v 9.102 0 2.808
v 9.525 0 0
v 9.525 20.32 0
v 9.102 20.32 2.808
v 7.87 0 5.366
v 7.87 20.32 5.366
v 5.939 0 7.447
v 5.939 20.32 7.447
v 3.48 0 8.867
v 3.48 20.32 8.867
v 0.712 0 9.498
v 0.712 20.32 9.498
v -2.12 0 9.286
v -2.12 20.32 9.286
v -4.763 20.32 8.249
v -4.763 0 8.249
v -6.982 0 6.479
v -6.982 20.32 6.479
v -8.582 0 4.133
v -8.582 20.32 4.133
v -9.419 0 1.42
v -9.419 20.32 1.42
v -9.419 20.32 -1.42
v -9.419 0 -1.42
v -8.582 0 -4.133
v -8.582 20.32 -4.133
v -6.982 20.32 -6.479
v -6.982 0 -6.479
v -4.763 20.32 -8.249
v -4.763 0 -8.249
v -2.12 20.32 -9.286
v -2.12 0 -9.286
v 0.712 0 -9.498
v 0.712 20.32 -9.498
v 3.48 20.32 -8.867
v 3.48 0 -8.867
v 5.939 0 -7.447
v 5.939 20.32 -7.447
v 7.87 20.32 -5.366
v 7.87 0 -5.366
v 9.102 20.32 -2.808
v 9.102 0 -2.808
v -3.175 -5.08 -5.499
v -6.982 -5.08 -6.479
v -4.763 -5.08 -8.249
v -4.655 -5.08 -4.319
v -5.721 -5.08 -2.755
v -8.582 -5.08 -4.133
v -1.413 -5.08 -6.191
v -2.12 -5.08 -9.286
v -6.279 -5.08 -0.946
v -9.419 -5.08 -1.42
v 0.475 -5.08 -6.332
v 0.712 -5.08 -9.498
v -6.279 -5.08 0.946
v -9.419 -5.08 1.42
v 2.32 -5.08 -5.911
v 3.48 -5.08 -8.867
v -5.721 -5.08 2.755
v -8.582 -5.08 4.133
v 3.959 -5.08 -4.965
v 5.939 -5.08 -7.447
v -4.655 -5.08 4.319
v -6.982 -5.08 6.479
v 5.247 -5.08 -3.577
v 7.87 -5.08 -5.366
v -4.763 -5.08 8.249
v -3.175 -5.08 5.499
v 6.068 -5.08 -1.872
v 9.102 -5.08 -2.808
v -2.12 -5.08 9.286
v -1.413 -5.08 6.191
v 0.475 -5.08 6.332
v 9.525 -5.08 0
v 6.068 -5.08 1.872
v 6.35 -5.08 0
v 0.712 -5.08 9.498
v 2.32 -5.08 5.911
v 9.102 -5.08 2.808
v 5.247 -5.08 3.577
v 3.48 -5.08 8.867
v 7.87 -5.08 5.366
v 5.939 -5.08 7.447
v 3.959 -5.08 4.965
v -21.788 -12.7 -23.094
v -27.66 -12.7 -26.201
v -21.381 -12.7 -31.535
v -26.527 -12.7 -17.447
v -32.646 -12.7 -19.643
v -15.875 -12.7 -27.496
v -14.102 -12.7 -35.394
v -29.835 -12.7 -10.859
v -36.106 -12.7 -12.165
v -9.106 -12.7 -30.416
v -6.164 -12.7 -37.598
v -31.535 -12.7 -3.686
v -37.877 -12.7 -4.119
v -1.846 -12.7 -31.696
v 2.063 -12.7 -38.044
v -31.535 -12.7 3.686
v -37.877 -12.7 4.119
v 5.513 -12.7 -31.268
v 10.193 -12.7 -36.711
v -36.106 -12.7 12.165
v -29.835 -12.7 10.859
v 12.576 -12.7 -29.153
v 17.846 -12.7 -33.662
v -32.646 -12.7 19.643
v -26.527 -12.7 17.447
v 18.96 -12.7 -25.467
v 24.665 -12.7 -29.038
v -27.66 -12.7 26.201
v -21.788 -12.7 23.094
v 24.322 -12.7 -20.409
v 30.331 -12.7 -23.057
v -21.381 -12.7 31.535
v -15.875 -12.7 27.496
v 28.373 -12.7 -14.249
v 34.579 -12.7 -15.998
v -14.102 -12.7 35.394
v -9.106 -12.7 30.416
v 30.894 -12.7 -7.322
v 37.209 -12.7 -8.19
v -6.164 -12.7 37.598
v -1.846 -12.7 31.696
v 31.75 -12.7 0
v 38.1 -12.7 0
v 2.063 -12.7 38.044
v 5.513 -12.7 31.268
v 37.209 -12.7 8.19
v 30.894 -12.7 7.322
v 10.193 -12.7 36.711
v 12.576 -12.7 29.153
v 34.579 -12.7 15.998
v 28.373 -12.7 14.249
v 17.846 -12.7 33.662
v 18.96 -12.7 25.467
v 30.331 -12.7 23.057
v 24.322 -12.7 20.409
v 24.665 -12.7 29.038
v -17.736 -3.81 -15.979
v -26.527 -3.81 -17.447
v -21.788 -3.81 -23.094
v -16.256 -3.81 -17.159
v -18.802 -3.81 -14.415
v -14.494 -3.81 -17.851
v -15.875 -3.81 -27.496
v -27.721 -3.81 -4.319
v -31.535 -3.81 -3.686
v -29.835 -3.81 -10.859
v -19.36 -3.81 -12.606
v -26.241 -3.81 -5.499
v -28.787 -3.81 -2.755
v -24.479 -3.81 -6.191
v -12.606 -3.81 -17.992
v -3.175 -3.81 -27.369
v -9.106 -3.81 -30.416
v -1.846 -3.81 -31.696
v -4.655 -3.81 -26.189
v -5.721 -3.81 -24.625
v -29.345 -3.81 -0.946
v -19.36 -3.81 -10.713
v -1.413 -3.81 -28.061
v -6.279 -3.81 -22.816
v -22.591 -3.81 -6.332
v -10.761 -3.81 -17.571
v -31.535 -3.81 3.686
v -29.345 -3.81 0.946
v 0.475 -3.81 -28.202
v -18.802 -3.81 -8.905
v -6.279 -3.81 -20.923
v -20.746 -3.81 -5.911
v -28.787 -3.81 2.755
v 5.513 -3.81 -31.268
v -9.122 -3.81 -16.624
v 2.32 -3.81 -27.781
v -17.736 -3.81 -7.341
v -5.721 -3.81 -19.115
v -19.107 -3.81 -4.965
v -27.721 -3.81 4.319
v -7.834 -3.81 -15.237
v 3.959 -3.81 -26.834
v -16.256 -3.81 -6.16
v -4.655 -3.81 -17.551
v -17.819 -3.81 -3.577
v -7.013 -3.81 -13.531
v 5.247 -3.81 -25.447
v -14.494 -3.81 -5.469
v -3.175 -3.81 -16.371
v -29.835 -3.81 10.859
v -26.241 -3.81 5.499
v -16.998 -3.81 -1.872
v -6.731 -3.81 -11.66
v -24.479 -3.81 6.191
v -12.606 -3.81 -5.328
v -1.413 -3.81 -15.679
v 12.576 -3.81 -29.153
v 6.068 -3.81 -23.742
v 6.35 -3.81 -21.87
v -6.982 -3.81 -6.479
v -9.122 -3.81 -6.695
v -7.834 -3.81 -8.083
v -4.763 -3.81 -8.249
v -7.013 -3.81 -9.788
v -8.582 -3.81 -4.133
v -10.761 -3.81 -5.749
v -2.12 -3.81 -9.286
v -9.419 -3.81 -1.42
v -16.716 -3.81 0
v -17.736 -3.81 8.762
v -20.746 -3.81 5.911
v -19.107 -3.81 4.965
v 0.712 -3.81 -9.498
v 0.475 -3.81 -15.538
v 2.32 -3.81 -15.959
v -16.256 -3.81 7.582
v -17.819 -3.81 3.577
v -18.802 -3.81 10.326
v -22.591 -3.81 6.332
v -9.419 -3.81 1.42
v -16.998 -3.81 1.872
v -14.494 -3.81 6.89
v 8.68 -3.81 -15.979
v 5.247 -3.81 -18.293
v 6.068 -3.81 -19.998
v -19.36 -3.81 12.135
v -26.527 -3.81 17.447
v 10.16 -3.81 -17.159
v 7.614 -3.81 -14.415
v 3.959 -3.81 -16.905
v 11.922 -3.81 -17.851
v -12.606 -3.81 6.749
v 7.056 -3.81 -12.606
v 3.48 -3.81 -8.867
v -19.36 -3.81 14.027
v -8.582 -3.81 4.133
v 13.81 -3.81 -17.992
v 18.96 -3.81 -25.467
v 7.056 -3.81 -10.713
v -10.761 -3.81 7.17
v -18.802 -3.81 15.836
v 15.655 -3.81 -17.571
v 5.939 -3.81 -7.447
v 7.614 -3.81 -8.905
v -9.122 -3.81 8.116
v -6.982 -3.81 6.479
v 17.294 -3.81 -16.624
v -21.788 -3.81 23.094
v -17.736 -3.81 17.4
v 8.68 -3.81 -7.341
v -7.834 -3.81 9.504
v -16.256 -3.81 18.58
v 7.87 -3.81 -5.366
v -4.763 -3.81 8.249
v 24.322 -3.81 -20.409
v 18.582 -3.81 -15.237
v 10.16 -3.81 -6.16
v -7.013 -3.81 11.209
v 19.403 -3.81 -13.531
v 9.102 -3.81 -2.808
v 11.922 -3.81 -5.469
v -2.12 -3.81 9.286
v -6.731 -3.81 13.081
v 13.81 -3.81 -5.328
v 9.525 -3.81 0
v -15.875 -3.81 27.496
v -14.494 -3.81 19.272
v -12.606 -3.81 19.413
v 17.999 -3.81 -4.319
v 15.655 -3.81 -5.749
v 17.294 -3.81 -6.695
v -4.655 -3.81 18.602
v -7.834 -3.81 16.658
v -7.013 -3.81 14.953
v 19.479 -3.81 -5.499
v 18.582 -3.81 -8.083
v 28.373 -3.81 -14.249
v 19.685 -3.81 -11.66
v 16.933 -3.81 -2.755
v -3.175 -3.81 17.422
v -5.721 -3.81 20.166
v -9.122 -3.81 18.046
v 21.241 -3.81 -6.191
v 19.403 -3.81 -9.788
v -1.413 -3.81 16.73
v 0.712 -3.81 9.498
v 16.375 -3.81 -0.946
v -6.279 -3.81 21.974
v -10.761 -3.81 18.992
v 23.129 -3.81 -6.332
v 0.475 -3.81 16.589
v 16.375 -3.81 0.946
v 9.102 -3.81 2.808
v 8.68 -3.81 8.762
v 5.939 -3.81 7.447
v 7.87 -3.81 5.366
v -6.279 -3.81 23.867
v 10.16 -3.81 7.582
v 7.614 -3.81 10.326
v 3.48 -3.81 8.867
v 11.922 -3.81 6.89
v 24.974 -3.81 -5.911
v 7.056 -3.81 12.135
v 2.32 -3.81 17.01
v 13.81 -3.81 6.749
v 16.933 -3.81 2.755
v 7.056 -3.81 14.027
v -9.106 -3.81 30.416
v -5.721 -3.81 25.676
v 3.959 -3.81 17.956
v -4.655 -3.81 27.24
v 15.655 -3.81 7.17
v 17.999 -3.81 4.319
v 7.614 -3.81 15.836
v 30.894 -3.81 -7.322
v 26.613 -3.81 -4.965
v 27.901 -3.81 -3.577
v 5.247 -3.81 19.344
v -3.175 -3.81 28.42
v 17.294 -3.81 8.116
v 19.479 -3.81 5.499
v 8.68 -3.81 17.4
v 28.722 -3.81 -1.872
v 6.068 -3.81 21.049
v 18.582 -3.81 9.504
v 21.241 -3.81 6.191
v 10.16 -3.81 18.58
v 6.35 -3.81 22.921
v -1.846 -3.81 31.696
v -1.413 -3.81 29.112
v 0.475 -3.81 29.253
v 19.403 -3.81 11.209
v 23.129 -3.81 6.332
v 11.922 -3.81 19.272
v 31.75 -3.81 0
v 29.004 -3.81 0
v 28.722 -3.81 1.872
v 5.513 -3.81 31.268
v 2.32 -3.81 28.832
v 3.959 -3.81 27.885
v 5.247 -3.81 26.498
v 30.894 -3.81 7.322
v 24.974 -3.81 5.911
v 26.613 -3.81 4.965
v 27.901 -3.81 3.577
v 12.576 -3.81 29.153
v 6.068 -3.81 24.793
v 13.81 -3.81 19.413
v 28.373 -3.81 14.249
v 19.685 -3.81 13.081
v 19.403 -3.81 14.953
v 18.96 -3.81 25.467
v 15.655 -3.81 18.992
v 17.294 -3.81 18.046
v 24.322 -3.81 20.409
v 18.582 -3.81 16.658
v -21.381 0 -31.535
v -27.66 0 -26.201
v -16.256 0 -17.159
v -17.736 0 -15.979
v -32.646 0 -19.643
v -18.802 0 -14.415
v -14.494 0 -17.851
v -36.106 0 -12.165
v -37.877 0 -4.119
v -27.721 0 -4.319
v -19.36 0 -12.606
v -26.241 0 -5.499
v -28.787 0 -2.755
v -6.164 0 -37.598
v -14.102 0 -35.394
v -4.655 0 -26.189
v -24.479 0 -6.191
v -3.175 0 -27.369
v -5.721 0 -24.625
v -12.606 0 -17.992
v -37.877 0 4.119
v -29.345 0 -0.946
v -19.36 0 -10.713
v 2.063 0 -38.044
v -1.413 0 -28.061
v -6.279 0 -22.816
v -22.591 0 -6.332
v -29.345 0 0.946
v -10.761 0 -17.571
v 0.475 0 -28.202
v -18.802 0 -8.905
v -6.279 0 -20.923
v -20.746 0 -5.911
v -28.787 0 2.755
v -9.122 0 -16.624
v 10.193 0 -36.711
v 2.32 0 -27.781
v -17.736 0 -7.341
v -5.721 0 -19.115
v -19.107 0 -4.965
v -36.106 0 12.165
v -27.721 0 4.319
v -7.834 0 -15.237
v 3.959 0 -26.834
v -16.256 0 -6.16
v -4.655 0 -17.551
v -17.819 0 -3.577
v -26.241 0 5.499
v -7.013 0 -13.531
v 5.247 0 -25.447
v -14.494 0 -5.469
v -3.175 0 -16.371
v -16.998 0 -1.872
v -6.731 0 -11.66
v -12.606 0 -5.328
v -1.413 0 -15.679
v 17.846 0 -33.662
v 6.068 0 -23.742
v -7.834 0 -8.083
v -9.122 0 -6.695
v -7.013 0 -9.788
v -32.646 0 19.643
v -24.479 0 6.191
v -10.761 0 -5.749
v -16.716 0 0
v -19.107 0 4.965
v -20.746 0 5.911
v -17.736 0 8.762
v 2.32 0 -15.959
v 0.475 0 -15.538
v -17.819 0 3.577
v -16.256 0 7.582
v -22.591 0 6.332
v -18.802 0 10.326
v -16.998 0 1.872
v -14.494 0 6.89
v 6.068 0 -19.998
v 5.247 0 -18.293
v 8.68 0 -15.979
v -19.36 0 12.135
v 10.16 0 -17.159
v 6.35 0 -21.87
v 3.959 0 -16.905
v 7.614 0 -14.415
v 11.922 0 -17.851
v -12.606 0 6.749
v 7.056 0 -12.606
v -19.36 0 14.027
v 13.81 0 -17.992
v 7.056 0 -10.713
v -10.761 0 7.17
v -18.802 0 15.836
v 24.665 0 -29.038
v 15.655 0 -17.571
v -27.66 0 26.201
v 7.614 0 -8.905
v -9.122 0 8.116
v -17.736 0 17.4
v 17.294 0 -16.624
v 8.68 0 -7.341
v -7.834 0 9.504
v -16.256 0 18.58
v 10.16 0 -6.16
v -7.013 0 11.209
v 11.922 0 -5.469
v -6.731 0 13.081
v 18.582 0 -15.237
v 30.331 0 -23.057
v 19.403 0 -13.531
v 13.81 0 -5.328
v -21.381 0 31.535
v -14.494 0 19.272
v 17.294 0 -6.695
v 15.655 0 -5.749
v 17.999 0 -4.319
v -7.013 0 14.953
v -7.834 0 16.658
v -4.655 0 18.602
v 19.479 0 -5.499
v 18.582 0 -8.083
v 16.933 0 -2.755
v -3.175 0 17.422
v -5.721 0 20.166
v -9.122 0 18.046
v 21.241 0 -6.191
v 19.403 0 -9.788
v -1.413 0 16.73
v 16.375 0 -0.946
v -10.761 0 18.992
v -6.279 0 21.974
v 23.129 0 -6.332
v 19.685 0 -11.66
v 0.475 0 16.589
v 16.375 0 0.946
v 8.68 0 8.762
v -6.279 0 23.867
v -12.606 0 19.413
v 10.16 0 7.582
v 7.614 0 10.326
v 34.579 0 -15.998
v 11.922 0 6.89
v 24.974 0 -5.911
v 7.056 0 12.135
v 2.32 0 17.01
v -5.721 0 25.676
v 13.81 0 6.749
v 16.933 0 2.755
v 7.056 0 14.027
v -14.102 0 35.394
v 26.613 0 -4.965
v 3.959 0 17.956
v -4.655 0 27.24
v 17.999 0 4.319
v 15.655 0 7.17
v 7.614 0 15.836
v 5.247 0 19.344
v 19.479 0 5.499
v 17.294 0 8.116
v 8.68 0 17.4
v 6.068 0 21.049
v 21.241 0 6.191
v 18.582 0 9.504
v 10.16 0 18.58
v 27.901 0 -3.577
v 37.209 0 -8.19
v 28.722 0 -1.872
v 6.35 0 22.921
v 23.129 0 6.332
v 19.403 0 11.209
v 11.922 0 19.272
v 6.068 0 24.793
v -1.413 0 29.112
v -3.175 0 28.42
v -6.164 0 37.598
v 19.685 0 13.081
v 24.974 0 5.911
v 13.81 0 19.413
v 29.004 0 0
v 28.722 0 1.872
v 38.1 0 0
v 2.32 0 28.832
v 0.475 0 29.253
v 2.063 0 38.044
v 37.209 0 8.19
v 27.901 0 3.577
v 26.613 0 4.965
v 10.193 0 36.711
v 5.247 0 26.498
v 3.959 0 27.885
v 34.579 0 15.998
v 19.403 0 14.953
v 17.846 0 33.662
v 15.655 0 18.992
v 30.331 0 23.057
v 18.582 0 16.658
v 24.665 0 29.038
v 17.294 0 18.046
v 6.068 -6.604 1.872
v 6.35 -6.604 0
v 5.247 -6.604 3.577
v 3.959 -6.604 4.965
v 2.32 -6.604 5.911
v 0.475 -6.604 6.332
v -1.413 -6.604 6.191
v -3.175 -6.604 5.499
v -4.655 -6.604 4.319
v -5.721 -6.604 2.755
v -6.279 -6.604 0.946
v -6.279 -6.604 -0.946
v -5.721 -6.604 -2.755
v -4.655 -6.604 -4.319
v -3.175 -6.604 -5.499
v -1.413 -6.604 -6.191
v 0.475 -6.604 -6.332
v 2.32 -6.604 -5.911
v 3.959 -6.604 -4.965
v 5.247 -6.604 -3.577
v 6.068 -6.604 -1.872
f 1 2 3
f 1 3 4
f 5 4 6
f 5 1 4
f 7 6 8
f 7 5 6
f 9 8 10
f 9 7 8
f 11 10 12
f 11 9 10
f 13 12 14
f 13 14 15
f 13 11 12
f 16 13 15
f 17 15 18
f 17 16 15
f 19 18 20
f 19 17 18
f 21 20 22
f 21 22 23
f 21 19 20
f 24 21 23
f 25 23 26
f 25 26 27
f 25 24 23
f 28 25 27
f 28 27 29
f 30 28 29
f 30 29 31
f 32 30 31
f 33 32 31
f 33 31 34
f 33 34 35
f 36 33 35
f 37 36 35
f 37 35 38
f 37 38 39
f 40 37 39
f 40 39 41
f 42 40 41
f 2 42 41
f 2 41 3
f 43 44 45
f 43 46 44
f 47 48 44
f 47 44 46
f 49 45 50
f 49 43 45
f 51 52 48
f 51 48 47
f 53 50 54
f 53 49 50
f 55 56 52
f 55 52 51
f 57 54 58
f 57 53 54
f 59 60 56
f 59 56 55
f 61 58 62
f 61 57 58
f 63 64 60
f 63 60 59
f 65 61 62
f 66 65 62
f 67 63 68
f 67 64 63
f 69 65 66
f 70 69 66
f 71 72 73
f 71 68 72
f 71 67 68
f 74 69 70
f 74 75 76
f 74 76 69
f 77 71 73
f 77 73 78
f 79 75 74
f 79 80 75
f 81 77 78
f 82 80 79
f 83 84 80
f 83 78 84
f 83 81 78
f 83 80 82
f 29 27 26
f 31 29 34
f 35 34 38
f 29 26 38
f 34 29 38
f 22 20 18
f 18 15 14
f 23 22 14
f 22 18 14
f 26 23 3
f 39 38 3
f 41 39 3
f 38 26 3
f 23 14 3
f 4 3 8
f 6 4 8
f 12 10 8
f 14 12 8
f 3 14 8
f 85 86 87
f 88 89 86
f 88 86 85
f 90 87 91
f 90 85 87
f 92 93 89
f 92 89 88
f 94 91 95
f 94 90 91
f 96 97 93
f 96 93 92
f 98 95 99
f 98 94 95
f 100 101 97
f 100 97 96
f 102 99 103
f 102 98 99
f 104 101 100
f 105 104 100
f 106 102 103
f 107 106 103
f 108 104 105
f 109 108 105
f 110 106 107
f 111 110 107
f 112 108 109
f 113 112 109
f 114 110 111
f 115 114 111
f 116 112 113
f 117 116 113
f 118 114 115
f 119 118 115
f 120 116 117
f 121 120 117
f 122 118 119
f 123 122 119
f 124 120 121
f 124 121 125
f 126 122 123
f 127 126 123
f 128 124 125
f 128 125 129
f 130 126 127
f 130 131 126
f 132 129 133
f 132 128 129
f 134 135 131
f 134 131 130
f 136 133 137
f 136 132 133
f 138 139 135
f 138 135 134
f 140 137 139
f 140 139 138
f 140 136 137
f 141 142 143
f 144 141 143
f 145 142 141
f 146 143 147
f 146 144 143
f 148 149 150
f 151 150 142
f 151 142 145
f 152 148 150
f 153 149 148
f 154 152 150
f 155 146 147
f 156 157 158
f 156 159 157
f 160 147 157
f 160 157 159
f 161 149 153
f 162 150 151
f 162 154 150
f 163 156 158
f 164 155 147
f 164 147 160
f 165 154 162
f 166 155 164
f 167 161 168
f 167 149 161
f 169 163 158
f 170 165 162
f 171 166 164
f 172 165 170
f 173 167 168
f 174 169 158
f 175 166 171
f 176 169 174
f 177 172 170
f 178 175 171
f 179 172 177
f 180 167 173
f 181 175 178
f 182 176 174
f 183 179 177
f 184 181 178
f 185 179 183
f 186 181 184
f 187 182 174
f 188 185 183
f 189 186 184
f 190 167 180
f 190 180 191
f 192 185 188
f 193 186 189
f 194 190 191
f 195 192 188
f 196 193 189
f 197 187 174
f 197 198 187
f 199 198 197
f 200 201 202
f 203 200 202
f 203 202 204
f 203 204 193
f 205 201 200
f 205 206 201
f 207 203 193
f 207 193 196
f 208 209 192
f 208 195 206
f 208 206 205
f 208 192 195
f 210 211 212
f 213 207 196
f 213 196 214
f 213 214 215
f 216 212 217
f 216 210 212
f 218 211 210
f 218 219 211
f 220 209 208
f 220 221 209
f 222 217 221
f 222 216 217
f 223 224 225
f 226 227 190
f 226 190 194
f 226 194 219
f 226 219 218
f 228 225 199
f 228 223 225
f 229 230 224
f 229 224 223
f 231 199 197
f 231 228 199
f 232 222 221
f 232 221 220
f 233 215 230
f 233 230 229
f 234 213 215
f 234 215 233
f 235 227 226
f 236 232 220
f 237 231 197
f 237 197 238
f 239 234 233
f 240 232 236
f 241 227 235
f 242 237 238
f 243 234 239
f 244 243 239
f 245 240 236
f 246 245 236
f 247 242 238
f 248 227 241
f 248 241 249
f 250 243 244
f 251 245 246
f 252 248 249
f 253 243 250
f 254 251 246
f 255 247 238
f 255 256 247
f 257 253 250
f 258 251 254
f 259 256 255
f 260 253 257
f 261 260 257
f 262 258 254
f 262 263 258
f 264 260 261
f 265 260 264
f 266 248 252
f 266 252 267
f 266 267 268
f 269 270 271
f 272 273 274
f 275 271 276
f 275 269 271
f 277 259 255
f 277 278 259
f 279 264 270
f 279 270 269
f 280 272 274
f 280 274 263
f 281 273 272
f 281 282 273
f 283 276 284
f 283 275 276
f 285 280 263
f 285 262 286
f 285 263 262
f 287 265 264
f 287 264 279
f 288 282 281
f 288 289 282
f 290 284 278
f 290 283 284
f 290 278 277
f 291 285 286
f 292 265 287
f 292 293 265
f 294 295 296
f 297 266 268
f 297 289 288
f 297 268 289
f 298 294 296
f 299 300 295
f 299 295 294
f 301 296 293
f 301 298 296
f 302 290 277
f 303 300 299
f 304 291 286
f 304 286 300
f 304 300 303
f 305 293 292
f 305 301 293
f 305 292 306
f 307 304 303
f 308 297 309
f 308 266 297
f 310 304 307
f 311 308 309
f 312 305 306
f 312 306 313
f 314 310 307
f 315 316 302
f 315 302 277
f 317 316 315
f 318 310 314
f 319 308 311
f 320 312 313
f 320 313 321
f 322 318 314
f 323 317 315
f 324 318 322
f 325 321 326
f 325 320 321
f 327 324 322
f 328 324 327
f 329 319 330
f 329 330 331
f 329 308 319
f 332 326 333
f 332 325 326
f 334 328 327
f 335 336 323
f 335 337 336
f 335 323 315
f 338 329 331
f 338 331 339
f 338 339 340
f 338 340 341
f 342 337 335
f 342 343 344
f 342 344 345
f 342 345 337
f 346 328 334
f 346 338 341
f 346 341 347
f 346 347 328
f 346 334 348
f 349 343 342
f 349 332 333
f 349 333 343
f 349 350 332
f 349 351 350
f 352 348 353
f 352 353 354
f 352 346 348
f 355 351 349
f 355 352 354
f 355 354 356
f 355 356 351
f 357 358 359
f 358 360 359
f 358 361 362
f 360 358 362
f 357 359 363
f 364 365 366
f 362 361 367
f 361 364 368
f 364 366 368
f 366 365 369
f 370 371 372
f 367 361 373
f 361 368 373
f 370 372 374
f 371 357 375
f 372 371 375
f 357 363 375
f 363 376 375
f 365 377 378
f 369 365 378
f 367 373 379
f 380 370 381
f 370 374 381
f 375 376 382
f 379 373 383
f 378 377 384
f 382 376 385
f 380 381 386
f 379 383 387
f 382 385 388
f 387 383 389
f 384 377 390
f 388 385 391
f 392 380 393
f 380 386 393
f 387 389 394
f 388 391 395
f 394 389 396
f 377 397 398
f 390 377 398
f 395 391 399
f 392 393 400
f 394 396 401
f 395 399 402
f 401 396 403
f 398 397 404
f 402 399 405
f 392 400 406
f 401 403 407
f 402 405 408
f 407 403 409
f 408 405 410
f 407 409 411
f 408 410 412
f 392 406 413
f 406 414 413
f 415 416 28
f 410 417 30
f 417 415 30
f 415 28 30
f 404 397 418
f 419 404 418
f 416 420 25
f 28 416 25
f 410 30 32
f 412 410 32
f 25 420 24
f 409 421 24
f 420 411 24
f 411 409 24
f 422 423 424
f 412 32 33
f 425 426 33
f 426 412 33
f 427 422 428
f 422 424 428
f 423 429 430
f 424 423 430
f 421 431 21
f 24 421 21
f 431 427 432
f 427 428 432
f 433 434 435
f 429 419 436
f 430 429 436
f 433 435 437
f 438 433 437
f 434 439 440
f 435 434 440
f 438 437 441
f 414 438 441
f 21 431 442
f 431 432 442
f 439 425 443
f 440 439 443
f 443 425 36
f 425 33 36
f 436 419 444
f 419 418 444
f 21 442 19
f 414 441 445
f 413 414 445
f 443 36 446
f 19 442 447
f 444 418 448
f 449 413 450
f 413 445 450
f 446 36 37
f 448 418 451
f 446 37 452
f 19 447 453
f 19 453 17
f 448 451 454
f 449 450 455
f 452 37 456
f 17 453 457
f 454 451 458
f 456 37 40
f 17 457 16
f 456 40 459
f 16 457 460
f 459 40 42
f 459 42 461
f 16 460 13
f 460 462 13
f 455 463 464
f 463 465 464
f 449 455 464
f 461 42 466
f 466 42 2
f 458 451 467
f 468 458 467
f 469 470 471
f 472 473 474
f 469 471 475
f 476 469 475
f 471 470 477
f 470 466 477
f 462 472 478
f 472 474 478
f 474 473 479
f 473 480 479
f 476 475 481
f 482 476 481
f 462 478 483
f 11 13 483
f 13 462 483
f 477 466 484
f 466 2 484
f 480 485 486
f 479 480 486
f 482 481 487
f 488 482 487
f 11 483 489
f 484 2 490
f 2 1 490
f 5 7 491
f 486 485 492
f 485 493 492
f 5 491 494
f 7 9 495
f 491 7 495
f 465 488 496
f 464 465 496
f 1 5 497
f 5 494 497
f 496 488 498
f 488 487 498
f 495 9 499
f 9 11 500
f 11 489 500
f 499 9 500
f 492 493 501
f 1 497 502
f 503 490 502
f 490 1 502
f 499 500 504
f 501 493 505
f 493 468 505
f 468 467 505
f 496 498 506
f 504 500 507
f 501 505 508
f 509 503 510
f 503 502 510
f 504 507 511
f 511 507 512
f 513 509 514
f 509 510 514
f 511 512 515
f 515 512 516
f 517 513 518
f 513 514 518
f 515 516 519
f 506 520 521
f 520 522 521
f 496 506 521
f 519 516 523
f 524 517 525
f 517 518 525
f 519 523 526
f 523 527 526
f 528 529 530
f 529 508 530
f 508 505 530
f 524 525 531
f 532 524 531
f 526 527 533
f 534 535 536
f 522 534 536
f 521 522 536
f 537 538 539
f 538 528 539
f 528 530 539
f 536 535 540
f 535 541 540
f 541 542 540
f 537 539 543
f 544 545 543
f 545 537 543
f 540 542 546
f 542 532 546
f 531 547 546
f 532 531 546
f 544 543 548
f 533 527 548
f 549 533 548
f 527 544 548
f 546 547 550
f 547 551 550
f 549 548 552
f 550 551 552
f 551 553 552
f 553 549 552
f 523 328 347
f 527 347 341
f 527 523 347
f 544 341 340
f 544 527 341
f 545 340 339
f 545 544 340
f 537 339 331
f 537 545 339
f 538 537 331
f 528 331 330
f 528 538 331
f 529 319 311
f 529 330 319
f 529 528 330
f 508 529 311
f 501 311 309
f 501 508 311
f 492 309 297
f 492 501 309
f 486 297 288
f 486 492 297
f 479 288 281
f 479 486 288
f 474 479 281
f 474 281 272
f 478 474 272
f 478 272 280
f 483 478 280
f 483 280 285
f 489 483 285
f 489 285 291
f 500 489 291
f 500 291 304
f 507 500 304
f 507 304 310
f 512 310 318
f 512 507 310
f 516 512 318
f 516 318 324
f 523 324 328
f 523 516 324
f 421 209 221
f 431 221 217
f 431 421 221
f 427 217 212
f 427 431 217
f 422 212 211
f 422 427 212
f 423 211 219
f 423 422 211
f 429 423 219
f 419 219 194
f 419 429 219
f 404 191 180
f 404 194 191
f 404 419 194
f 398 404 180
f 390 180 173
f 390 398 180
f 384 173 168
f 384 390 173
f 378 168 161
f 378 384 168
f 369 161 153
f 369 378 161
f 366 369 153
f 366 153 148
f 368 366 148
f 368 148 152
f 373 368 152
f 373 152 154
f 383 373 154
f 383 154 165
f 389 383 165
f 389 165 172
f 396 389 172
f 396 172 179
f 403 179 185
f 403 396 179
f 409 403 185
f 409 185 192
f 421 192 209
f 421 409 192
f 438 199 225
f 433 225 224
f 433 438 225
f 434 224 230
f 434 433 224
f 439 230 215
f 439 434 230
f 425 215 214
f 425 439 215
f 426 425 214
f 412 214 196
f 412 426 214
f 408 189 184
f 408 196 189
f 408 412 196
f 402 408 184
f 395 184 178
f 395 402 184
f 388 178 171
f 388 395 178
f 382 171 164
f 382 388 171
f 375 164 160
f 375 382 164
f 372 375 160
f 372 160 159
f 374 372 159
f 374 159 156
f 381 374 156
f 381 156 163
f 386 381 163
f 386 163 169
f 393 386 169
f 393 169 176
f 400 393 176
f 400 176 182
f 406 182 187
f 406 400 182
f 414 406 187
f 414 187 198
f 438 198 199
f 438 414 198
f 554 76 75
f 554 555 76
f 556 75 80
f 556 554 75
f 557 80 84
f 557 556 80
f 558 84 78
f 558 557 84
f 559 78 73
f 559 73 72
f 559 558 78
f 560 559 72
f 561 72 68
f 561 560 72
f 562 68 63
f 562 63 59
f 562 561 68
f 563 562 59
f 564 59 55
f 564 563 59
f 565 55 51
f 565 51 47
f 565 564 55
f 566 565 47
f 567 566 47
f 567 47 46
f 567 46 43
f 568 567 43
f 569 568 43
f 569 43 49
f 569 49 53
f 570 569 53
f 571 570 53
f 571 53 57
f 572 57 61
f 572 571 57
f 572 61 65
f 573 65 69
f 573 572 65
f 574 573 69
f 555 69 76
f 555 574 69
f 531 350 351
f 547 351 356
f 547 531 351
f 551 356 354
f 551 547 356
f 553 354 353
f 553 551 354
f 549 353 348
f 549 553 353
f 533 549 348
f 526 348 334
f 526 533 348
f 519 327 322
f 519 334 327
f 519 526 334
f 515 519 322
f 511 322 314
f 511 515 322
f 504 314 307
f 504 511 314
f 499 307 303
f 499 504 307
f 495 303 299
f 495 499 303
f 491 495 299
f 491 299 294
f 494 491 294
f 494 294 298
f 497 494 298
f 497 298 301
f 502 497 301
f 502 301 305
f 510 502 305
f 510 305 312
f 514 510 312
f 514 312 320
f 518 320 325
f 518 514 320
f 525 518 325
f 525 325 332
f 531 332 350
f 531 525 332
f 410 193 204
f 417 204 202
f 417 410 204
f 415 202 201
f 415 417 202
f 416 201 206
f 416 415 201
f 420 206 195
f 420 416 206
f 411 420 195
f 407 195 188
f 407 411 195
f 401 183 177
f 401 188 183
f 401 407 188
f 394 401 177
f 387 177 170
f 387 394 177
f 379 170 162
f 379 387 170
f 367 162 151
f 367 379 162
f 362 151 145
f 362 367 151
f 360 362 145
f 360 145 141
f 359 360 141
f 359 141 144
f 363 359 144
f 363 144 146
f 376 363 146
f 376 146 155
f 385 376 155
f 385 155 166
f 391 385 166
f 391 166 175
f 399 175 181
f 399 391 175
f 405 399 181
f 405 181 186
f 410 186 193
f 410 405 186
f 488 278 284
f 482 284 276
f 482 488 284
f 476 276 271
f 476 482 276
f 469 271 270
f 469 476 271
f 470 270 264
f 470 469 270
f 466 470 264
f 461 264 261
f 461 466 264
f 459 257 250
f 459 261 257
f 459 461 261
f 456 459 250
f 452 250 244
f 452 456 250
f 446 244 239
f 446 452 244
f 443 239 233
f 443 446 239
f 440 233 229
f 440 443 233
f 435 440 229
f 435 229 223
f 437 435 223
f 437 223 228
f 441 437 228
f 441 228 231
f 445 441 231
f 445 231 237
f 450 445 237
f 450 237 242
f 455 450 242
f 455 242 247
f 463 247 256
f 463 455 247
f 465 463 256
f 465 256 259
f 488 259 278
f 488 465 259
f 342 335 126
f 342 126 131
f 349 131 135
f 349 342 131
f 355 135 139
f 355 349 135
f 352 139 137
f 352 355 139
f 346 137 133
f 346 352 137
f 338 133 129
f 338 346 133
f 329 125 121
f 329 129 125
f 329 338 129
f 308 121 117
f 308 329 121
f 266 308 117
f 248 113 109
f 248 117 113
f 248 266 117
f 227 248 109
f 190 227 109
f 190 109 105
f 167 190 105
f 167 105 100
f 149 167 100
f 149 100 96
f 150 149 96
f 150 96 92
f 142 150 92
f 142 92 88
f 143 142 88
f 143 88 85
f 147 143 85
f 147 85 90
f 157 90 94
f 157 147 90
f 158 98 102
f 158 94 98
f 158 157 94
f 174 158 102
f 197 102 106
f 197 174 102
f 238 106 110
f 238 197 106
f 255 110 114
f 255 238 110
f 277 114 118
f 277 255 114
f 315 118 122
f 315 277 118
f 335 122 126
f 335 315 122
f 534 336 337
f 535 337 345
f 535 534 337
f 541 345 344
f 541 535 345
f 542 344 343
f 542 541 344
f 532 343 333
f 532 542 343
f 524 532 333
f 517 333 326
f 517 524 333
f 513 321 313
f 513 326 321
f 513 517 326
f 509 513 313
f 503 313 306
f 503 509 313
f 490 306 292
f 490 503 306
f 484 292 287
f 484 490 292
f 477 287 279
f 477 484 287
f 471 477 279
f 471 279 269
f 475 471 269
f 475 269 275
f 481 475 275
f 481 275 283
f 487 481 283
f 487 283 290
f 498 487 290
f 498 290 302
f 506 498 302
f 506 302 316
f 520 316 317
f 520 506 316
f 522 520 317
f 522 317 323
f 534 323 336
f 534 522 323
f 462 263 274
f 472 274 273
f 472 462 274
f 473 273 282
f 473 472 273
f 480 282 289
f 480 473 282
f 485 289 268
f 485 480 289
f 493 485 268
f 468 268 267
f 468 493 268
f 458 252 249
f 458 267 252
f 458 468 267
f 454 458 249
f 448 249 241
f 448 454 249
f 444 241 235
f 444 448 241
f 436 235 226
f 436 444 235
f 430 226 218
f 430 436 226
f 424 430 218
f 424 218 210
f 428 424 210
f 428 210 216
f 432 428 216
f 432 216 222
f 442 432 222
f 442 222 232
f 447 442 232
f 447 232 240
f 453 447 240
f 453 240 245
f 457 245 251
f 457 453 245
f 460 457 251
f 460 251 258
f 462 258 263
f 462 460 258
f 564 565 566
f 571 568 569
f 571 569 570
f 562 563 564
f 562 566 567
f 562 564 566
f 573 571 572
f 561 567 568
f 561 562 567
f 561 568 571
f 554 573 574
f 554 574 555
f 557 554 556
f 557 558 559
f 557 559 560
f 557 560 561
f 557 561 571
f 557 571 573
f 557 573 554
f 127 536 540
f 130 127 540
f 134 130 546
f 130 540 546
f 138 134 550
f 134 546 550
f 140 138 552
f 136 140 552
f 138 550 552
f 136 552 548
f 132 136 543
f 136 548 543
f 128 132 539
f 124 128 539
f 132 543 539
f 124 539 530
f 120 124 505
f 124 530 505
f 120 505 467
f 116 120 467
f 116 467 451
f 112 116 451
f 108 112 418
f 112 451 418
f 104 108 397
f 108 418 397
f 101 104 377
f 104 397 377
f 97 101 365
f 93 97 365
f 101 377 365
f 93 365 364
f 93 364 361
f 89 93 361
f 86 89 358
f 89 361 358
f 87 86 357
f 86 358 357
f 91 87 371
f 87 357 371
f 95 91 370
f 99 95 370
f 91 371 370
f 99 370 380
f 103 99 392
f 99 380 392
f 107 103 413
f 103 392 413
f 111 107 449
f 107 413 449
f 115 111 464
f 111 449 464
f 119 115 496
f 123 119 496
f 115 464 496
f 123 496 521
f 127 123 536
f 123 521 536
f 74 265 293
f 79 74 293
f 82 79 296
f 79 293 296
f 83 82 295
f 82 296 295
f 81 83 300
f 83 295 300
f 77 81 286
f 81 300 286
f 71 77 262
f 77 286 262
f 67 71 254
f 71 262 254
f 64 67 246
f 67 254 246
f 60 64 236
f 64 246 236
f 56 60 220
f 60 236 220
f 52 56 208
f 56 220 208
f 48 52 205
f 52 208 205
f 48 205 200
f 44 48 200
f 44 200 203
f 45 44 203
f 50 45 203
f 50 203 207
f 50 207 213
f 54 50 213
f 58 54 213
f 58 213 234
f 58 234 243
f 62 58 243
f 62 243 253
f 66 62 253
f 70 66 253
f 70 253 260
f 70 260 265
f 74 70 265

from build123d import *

# Parameters (mm, degrees)
F0_R       = 38.1
F1_DEPTH   = 12.7
F2_R       = 31.75
F3_DEPTH   = 45.466
F4_R       = 34.925
F5_DEPTH   = 3.81
F6_R       = 6.35
F7_DEPTH   = 38.354
F8_R       = 6.35
F9_DEPTH   = 26.924
F10_R      = 9.525
F11_DEPTH  = 5.08
F11_FACE_R = 9.525
F12_DEPTH  = 25.4
F13_R      = 6.35
F14_DEPTH  = 6.604


with BuildPart() as f1:
    # F0 (on Front) → F1 (new body)
    with BuildSketch(Plane.XZ):
        Circle(F0_R)
    extrude(amount=F1_DEPTH)

    # F2 (on Front) → F3 (cut)
    with BuildSketch(Plane.XZ):
        Circle(F2_R)
    extrude(amount=F3_DEPTH, mode=Mode.SUBTRACT)

    # F4 (on Front) → F5 (join)
    with BuildSketch(Plane.XZ):
        Circle(F4_R)
    extrude(amount=F5_DEPTH)

    # F6 (on Front) → F7 (cut)
    with BuildSketch(Plane.XZ):
        with Locations((-13.081, 13.081)):
            Circle(F6_R)
        with Locations((13.334999, 13.081)):
            Circle(F6_R)
        with Locations((13.334999, -11.659759)):
            Circle(F6_R)
        with Locations((-13.081, -11.659759)):
            Circle(F6_R)
    extrude(amount=F7_DEPTH, mode=Mode.SUBTRACT)

    # F8 (on Front) → F9 (cut)
    with BuildSketch(Plane.XZ):
        with Locations((0, 22.920826)):
            Circle(F8_R)
        with Locations((22.654116, 0)):
            Circle(F8_R)
        with Locations((0, -21.869805)):
            Circle(F8_R)
        with Locations((-23.065884, 0)):
            Circle(F8_R)
    extrude(amount=F9_DEPTH, mode=Mode.SUBTRACT)

    # F10 (on Front) → F11 (join)
    with BuildSketch(Plane.XZ):
        Circle(F10_R)
    extrude(amount=F11_DEPTH)

    # F11_face (on face) → F12 (join)
    with BuildSketch(Plane.XZ.offset(5.08)):
        Circle(F11_FACE_R)
    extrude(amount=-F12_DEPTH)

    # F13 (on Front) → F14 (join, symmetric)
    with BuildSketch(Plane.XZ):
        Circle(F13_R)
    extrude(amount=F14_DEPTH, both=True)


solid = f1.part
